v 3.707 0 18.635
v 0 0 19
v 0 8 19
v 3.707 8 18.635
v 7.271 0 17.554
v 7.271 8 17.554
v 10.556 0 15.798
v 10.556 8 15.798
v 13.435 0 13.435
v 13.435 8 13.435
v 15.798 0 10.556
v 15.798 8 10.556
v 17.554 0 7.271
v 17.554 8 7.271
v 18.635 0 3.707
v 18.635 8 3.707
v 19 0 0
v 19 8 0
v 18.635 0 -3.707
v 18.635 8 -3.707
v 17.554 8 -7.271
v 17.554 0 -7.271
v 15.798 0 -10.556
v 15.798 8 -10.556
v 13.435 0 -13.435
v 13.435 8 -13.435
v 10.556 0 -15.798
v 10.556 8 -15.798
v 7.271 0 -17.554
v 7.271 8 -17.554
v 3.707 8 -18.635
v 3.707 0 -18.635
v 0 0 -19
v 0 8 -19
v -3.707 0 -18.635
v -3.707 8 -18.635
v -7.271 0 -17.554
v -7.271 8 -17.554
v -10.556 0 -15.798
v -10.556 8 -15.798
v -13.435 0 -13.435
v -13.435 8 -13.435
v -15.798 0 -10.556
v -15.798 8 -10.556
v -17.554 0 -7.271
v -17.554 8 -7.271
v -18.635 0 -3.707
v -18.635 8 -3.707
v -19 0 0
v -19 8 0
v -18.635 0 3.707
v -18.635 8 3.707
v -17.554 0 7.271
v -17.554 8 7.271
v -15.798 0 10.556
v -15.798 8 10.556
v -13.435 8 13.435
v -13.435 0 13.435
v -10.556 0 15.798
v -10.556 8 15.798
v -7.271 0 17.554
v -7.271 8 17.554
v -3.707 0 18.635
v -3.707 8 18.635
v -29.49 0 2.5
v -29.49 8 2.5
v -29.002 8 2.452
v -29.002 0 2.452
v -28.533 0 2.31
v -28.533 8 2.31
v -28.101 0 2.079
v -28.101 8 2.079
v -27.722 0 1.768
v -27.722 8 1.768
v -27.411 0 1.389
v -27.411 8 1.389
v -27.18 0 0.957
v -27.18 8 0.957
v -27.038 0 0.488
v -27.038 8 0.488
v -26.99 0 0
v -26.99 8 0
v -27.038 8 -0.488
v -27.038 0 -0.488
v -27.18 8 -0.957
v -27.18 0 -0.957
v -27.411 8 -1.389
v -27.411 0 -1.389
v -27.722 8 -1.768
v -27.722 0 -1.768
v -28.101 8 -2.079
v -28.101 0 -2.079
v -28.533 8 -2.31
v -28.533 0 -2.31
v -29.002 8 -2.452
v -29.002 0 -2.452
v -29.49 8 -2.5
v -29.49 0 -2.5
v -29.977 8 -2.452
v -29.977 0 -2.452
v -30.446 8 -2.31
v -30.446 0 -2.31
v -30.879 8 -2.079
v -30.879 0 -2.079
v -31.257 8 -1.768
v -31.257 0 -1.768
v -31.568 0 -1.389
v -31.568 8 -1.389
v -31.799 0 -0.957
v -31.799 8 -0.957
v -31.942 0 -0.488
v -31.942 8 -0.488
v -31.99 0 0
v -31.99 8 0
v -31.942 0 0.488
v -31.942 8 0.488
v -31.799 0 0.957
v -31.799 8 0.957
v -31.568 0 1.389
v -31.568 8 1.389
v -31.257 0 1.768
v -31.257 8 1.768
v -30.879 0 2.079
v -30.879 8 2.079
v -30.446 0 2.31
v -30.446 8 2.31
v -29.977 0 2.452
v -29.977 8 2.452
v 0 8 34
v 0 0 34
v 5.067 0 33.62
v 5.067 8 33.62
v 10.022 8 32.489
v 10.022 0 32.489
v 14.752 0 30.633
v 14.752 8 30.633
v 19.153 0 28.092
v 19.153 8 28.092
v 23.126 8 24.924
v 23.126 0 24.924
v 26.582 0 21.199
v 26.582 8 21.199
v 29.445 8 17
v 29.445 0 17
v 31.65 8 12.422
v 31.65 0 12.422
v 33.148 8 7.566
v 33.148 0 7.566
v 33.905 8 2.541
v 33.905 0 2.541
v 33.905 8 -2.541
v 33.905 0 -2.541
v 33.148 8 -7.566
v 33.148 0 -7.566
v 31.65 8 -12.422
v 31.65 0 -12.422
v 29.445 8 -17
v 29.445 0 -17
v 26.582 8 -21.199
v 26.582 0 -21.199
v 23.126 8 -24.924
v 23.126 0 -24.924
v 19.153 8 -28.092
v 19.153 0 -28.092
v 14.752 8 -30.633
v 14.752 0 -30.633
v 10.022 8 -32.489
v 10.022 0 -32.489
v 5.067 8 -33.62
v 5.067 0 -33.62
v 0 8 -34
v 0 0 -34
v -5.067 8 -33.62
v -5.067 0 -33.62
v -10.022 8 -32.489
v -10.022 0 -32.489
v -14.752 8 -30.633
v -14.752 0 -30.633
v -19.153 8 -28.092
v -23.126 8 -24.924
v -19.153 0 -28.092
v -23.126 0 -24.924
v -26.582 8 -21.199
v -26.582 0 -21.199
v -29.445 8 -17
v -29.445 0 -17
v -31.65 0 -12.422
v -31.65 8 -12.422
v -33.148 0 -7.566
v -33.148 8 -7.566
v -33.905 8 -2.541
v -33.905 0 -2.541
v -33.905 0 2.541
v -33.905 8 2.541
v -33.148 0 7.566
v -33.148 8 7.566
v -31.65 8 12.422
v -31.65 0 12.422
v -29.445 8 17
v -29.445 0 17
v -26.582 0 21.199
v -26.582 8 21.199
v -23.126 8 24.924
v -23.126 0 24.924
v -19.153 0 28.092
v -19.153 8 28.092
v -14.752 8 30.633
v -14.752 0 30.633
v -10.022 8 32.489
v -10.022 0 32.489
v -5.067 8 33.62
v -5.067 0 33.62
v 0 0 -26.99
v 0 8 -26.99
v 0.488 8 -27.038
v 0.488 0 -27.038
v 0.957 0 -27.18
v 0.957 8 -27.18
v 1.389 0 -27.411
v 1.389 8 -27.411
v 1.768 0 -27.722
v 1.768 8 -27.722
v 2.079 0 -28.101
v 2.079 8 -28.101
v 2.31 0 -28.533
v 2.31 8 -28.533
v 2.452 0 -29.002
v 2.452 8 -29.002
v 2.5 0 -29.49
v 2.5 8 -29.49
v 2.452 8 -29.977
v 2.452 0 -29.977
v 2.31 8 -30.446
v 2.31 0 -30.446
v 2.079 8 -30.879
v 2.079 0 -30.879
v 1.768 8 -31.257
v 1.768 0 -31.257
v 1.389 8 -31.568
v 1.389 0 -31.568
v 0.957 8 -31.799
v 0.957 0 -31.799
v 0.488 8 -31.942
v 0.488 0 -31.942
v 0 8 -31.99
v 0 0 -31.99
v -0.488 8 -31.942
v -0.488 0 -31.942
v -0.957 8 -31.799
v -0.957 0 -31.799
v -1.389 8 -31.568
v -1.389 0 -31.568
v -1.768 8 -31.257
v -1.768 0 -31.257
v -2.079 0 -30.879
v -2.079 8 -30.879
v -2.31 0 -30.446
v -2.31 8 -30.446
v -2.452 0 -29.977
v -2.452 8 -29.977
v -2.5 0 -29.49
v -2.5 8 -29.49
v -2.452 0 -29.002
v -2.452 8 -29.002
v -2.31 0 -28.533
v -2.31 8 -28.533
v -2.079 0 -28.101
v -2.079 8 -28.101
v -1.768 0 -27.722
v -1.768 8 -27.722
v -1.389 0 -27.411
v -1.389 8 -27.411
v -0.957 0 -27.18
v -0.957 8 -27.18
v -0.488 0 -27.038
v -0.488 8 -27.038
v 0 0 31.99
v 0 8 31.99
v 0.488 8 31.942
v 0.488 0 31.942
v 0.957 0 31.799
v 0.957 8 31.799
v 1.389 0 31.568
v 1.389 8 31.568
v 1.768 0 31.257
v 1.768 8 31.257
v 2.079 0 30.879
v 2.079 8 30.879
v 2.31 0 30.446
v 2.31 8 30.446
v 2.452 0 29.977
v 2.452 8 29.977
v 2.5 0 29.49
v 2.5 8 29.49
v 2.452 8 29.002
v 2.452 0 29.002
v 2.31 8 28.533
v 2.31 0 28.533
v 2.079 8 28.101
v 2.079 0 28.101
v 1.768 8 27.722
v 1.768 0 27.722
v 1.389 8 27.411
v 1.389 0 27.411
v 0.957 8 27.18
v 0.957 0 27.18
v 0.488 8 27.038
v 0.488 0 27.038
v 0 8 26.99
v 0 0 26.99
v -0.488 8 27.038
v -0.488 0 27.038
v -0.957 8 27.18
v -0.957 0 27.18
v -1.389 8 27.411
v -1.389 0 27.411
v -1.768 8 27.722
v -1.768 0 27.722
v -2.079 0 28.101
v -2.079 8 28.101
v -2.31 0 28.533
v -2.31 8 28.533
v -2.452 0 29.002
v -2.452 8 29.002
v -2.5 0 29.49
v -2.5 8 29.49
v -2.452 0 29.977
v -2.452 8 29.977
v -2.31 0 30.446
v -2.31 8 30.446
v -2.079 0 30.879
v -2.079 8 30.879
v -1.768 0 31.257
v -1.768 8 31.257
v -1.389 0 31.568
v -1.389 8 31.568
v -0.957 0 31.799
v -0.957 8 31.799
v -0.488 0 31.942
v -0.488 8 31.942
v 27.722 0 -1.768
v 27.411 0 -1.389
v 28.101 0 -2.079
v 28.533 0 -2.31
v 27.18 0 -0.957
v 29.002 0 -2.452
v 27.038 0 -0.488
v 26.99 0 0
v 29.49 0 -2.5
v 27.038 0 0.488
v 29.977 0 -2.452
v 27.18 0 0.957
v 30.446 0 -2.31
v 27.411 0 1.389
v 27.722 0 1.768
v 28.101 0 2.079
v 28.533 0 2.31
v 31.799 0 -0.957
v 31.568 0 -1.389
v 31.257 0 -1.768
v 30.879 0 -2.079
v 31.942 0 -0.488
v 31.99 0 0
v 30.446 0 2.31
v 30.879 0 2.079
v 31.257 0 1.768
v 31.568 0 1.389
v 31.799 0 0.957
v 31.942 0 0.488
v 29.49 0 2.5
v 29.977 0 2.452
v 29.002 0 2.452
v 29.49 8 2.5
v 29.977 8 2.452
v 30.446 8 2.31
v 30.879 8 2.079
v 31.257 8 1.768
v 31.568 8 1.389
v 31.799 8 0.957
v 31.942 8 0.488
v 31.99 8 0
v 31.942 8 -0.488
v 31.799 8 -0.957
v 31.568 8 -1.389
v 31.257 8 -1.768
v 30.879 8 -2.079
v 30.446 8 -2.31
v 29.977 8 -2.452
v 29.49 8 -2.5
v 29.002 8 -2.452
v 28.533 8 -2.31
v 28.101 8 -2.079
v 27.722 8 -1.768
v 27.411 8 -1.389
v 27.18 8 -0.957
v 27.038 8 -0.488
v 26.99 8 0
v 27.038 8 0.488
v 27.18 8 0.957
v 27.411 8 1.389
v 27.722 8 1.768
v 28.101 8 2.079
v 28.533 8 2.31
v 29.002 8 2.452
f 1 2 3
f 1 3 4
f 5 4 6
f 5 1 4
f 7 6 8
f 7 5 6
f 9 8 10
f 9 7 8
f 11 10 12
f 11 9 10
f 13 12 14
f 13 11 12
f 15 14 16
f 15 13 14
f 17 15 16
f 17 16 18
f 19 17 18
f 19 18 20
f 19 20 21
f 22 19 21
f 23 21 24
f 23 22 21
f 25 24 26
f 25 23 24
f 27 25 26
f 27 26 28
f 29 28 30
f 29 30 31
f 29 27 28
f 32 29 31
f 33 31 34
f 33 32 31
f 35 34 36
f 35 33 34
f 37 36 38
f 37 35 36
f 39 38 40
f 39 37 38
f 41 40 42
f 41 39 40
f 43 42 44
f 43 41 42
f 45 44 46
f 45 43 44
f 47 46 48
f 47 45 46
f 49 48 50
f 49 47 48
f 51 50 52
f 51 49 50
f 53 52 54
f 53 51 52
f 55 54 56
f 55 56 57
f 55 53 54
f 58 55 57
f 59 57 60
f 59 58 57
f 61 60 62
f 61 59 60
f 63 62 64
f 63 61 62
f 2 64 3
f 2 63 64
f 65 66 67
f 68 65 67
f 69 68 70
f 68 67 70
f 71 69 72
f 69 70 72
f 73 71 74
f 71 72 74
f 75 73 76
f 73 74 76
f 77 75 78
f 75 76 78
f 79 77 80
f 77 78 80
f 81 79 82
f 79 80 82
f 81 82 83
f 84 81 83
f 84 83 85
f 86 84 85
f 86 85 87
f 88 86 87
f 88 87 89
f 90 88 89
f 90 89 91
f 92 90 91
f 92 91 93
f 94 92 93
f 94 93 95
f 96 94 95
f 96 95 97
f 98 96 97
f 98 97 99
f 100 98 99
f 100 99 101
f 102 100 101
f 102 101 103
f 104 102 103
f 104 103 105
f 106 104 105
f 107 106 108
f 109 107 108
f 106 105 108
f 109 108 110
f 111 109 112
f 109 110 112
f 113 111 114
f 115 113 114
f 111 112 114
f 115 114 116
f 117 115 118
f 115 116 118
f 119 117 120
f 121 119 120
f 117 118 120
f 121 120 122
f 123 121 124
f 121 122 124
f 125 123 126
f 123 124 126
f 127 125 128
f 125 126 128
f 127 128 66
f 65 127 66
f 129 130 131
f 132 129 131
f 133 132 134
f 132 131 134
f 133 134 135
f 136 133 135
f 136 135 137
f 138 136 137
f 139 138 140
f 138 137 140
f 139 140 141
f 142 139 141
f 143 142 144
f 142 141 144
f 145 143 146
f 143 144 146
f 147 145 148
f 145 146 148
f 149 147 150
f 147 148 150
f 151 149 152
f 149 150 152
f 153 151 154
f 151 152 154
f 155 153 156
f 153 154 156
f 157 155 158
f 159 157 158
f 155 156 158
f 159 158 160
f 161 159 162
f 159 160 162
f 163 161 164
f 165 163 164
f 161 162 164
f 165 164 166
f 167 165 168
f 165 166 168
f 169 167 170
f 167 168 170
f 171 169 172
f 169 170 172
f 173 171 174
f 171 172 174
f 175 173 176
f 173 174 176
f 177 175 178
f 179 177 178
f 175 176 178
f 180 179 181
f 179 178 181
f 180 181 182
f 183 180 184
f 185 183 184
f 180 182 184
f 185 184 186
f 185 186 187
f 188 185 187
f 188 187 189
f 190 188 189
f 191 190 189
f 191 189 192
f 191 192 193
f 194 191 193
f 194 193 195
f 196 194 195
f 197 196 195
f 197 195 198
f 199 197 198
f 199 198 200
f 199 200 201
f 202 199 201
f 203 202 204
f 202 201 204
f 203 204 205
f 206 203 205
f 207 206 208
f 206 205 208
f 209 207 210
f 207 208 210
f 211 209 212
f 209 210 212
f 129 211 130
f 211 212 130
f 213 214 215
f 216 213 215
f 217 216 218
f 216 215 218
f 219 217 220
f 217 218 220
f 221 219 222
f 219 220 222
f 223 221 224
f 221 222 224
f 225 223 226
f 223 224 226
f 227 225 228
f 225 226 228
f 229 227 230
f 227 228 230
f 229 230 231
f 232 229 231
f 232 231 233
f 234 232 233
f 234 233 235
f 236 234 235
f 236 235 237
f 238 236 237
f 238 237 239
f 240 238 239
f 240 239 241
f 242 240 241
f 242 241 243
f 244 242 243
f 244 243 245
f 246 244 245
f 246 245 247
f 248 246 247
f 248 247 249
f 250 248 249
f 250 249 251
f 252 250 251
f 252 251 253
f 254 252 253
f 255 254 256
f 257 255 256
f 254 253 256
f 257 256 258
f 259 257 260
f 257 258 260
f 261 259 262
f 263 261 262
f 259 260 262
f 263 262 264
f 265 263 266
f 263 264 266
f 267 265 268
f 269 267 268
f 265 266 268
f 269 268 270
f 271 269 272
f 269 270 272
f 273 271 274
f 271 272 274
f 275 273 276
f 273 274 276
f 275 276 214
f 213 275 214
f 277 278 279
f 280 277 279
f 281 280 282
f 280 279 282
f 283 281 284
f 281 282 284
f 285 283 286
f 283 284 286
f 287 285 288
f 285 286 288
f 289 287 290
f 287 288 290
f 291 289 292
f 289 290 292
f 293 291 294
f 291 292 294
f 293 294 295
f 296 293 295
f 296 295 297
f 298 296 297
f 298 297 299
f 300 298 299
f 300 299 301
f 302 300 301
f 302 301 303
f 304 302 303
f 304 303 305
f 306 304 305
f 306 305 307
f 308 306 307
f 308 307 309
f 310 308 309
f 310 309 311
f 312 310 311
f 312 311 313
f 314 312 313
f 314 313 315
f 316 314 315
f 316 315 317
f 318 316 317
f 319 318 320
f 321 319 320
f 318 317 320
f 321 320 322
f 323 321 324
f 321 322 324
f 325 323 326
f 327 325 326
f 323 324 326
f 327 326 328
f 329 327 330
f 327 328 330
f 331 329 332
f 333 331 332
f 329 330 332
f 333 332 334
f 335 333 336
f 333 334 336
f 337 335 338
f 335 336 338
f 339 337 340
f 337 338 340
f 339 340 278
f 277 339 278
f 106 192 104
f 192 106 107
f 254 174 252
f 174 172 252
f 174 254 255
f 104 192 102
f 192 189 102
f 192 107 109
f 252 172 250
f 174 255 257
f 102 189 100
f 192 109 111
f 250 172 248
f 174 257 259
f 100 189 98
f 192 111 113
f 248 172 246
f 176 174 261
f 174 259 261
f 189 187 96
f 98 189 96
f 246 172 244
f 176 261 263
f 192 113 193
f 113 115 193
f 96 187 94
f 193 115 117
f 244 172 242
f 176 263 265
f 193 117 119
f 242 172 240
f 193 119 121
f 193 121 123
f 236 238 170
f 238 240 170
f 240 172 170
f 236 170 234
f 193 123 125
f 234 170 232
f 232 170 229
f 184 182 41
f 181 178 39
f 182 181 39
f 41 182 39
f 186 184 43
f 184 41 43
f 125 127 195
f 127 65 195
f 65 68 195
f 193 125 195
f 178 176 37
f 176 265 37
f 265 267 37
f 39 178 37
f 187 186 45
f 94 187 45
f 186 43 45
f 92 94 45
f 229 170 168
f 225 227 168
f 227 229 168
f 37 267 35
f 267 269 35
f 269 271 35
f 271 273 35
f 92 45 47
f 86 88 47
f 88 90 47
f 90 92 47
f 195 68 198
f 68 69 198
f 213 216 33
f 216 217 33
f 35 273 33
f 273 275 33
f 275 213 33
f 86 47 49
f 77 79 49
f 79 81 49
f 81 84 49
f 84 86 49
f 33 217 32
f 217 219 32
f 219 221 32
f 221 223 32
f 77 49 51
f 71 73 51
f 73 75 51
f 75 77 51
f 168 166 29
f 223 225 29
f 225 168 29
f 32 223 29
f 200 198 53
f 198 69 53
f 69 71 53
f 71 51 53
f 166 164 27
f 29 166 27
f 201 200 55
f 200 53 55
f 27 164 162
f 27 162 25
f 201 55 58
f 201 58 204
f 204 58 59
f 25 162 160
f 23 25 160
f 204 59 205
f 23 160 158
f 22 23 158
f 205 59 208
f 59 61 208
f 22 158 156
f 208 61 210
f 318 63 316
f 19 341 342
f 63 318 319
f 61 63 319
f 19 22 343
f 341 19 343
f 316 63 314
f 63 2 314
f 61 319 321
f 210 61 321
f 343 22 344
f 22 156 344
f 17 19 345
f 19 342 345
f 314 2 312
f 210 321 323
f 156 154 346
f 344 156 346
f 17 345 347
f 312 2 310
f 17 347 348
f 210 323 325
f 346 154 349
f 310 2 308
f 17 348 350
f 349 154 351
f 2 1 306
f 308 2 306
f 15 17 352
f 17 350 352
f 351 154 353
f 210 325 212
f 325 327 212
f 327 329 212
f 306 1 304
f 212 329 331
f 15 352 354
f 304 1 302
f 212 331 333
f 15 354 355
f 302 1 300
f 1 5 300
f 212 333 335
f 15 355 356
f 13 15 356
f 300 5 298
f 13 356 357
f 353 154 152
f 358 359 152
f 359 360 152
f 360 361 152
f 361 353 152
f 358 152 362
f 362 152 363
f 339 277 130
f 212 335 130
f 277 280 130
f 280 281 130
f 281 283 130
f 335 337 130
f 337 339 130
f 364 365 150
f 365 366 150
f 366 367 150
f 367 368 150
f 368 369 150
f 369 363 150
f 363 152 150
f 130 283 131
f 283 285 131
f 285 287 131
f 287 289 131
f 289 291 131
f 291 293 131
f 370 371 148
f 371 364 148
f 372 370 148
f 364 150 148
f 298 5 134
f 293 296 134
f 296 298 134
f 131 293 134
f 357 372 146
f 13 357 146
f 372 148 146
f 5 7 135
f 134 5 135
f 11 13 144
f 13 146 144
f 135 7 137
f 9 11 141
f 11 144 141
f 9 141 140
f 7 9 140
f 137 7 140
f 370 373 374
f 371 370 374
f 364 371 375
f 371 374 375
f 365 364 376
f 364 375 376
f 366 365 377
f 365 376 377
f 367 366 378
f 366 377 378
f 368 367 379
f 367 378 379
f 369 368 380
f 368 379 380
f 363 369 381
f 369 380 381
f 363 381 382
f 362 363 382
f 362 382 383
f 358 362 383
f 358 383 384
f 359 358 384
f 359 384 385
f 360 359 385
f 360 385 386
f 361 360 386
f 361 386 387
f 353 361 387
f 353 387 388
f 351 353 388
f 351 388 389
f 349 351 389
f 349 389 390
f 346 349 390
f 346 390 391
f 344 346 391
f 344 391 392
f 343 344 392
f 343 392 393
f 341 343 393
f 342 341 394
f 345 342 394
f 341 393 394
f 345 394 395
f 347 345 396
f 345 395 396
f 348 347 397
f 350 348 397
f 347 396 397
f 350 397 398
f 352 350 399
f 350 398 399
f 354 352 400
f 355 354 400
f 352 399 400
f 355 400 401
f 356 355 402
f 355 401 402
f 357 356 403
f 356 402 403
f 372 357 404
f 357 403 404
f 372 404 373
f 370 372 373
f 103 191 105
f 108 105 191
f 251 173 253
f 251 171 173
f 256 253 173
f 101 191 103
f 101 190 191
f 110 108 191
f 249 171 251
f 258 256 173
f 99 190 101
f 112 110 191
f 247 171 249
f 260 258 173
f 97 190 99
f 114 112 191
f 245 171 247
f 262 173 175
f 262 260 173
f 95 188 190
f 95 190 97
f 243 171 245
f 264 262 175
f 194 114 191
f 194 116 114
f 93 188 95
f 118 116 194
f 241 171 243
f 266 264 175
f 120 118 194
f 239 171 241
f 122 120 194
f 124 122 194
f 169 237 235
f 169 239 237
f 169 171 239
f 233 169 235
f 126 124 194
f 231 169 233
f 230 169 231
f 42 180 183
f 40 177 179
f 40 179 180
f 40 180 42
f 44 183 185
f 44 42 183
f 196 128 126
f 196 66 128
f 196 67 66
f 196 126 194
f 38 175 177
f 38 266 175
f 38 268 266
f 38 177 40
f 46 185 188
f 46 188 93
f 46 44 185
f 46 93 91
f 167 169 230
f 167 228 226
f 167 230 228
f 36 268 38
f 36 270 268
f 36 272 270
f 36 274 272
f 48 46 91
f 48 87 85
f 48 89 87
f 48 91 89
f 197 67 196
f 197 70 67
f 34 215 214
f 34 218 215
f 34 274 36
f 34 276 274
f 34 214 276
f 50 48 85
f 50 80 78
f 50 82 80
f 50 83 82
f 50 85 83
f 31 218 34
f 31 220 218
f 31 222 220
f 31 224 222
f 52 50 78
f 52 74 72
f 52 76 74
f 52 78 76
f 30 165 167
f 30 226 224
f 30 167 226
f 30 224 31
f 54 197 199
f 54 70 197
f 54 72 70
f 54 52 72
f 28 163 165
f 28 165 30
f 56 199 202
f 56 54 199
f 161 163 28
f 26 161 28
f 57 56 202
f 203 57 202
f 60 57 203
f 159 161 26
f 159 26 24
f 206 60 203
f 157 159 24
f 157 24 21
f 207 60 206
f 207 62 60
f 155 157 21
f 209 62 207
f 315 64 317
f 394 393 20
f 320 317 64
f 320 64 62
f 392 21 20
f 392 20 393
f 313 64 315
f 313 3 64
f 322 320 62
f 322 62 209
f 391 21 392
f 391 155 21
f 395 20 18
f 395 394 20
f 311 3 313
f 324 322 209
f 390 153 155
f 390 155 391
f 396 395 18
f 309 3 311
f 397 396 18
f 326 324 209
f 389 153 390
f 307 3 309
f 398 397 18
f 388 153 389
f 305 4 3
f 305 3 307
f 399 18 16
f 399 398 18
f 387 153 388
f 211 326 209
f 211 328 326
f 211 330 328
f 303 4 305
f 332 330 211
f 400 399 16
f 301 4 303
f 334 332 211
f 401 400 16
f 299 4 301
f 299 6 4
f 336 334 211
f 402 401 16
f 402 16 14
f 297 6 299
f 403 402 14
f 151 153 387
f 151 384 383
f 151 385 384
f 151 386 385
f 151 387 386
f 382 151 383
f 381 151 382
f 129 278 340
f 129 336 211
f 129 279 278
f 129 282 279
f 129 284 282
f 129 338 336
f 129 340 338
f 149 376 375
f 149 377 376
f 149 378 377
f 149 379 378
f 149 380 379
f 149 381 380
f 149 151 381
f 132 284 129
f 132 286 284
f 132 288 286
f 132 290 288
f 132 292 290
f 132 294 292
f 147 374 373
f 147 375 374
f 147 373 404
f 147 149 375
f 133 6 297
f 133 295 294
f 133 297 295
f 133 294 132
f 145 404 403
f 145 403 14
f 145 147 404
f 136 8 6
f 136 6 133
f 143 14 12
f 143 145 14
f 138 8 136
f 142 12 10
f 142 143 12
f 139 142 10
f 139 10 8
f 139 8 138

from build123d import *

# Parameters (mm, degrees)
SKETCH_1_R          = 34
SKETCH_1_R_2        = 19
EXTRUDE_1_DEPTH     = 8
SKETCH_2_R          = 2.5
CUT_EXTRUDE_1_DEPTH = 49.744230428


with BuildPart() as part:
    # Эскиз1 → Вытянуть1 (new body)
    with BuildSketch(Plane(origin=(0, 0, 0), x_dir=(1, 0, 0), z_dir=(0, 1, 0))):
        with Locations(Location((0, 0, 0), (0, 0, 270))):
            Circle(SKETCH_1_R)
        with Locations(Location((0, 0, 0), (0, 0, 270))):
            Circle(SKETCH_1_R_2, mode=Mode.SUBTRACT)
    extrude(amount=EXTRUDE_1_DEPTH)

    # Эскиз2 → Вырез-Вытянуть1 (cut, through all)
    with BuildSketch(Plane(origin=(0, 8, 0), x_dir=(1, 0, 0), z_dir=(0, 1, 0))):
        with Locations(Location((0, 29.48960133, 0), (0, 0, 270))):
            Circle(SKETCH_2_R)
        with Locations(Location((29.48960133, 0, 0), (0, 0, 270))):
            Circle(SKETCH_2_R)
        with Locations(Location((0, -29.48960133, 0), (0, 0, 270))):
            Circle(SKETCH_2_R)
        with Locations(Location((-29.48960133, 0, 0), (0, 0, 270))):
            Circle(SKETCH_2_R)
    extrude(amount=-CUT_EXTRUDE_1_DEPTH, mode=Mode.SUBTRACT)


solid = part.part
